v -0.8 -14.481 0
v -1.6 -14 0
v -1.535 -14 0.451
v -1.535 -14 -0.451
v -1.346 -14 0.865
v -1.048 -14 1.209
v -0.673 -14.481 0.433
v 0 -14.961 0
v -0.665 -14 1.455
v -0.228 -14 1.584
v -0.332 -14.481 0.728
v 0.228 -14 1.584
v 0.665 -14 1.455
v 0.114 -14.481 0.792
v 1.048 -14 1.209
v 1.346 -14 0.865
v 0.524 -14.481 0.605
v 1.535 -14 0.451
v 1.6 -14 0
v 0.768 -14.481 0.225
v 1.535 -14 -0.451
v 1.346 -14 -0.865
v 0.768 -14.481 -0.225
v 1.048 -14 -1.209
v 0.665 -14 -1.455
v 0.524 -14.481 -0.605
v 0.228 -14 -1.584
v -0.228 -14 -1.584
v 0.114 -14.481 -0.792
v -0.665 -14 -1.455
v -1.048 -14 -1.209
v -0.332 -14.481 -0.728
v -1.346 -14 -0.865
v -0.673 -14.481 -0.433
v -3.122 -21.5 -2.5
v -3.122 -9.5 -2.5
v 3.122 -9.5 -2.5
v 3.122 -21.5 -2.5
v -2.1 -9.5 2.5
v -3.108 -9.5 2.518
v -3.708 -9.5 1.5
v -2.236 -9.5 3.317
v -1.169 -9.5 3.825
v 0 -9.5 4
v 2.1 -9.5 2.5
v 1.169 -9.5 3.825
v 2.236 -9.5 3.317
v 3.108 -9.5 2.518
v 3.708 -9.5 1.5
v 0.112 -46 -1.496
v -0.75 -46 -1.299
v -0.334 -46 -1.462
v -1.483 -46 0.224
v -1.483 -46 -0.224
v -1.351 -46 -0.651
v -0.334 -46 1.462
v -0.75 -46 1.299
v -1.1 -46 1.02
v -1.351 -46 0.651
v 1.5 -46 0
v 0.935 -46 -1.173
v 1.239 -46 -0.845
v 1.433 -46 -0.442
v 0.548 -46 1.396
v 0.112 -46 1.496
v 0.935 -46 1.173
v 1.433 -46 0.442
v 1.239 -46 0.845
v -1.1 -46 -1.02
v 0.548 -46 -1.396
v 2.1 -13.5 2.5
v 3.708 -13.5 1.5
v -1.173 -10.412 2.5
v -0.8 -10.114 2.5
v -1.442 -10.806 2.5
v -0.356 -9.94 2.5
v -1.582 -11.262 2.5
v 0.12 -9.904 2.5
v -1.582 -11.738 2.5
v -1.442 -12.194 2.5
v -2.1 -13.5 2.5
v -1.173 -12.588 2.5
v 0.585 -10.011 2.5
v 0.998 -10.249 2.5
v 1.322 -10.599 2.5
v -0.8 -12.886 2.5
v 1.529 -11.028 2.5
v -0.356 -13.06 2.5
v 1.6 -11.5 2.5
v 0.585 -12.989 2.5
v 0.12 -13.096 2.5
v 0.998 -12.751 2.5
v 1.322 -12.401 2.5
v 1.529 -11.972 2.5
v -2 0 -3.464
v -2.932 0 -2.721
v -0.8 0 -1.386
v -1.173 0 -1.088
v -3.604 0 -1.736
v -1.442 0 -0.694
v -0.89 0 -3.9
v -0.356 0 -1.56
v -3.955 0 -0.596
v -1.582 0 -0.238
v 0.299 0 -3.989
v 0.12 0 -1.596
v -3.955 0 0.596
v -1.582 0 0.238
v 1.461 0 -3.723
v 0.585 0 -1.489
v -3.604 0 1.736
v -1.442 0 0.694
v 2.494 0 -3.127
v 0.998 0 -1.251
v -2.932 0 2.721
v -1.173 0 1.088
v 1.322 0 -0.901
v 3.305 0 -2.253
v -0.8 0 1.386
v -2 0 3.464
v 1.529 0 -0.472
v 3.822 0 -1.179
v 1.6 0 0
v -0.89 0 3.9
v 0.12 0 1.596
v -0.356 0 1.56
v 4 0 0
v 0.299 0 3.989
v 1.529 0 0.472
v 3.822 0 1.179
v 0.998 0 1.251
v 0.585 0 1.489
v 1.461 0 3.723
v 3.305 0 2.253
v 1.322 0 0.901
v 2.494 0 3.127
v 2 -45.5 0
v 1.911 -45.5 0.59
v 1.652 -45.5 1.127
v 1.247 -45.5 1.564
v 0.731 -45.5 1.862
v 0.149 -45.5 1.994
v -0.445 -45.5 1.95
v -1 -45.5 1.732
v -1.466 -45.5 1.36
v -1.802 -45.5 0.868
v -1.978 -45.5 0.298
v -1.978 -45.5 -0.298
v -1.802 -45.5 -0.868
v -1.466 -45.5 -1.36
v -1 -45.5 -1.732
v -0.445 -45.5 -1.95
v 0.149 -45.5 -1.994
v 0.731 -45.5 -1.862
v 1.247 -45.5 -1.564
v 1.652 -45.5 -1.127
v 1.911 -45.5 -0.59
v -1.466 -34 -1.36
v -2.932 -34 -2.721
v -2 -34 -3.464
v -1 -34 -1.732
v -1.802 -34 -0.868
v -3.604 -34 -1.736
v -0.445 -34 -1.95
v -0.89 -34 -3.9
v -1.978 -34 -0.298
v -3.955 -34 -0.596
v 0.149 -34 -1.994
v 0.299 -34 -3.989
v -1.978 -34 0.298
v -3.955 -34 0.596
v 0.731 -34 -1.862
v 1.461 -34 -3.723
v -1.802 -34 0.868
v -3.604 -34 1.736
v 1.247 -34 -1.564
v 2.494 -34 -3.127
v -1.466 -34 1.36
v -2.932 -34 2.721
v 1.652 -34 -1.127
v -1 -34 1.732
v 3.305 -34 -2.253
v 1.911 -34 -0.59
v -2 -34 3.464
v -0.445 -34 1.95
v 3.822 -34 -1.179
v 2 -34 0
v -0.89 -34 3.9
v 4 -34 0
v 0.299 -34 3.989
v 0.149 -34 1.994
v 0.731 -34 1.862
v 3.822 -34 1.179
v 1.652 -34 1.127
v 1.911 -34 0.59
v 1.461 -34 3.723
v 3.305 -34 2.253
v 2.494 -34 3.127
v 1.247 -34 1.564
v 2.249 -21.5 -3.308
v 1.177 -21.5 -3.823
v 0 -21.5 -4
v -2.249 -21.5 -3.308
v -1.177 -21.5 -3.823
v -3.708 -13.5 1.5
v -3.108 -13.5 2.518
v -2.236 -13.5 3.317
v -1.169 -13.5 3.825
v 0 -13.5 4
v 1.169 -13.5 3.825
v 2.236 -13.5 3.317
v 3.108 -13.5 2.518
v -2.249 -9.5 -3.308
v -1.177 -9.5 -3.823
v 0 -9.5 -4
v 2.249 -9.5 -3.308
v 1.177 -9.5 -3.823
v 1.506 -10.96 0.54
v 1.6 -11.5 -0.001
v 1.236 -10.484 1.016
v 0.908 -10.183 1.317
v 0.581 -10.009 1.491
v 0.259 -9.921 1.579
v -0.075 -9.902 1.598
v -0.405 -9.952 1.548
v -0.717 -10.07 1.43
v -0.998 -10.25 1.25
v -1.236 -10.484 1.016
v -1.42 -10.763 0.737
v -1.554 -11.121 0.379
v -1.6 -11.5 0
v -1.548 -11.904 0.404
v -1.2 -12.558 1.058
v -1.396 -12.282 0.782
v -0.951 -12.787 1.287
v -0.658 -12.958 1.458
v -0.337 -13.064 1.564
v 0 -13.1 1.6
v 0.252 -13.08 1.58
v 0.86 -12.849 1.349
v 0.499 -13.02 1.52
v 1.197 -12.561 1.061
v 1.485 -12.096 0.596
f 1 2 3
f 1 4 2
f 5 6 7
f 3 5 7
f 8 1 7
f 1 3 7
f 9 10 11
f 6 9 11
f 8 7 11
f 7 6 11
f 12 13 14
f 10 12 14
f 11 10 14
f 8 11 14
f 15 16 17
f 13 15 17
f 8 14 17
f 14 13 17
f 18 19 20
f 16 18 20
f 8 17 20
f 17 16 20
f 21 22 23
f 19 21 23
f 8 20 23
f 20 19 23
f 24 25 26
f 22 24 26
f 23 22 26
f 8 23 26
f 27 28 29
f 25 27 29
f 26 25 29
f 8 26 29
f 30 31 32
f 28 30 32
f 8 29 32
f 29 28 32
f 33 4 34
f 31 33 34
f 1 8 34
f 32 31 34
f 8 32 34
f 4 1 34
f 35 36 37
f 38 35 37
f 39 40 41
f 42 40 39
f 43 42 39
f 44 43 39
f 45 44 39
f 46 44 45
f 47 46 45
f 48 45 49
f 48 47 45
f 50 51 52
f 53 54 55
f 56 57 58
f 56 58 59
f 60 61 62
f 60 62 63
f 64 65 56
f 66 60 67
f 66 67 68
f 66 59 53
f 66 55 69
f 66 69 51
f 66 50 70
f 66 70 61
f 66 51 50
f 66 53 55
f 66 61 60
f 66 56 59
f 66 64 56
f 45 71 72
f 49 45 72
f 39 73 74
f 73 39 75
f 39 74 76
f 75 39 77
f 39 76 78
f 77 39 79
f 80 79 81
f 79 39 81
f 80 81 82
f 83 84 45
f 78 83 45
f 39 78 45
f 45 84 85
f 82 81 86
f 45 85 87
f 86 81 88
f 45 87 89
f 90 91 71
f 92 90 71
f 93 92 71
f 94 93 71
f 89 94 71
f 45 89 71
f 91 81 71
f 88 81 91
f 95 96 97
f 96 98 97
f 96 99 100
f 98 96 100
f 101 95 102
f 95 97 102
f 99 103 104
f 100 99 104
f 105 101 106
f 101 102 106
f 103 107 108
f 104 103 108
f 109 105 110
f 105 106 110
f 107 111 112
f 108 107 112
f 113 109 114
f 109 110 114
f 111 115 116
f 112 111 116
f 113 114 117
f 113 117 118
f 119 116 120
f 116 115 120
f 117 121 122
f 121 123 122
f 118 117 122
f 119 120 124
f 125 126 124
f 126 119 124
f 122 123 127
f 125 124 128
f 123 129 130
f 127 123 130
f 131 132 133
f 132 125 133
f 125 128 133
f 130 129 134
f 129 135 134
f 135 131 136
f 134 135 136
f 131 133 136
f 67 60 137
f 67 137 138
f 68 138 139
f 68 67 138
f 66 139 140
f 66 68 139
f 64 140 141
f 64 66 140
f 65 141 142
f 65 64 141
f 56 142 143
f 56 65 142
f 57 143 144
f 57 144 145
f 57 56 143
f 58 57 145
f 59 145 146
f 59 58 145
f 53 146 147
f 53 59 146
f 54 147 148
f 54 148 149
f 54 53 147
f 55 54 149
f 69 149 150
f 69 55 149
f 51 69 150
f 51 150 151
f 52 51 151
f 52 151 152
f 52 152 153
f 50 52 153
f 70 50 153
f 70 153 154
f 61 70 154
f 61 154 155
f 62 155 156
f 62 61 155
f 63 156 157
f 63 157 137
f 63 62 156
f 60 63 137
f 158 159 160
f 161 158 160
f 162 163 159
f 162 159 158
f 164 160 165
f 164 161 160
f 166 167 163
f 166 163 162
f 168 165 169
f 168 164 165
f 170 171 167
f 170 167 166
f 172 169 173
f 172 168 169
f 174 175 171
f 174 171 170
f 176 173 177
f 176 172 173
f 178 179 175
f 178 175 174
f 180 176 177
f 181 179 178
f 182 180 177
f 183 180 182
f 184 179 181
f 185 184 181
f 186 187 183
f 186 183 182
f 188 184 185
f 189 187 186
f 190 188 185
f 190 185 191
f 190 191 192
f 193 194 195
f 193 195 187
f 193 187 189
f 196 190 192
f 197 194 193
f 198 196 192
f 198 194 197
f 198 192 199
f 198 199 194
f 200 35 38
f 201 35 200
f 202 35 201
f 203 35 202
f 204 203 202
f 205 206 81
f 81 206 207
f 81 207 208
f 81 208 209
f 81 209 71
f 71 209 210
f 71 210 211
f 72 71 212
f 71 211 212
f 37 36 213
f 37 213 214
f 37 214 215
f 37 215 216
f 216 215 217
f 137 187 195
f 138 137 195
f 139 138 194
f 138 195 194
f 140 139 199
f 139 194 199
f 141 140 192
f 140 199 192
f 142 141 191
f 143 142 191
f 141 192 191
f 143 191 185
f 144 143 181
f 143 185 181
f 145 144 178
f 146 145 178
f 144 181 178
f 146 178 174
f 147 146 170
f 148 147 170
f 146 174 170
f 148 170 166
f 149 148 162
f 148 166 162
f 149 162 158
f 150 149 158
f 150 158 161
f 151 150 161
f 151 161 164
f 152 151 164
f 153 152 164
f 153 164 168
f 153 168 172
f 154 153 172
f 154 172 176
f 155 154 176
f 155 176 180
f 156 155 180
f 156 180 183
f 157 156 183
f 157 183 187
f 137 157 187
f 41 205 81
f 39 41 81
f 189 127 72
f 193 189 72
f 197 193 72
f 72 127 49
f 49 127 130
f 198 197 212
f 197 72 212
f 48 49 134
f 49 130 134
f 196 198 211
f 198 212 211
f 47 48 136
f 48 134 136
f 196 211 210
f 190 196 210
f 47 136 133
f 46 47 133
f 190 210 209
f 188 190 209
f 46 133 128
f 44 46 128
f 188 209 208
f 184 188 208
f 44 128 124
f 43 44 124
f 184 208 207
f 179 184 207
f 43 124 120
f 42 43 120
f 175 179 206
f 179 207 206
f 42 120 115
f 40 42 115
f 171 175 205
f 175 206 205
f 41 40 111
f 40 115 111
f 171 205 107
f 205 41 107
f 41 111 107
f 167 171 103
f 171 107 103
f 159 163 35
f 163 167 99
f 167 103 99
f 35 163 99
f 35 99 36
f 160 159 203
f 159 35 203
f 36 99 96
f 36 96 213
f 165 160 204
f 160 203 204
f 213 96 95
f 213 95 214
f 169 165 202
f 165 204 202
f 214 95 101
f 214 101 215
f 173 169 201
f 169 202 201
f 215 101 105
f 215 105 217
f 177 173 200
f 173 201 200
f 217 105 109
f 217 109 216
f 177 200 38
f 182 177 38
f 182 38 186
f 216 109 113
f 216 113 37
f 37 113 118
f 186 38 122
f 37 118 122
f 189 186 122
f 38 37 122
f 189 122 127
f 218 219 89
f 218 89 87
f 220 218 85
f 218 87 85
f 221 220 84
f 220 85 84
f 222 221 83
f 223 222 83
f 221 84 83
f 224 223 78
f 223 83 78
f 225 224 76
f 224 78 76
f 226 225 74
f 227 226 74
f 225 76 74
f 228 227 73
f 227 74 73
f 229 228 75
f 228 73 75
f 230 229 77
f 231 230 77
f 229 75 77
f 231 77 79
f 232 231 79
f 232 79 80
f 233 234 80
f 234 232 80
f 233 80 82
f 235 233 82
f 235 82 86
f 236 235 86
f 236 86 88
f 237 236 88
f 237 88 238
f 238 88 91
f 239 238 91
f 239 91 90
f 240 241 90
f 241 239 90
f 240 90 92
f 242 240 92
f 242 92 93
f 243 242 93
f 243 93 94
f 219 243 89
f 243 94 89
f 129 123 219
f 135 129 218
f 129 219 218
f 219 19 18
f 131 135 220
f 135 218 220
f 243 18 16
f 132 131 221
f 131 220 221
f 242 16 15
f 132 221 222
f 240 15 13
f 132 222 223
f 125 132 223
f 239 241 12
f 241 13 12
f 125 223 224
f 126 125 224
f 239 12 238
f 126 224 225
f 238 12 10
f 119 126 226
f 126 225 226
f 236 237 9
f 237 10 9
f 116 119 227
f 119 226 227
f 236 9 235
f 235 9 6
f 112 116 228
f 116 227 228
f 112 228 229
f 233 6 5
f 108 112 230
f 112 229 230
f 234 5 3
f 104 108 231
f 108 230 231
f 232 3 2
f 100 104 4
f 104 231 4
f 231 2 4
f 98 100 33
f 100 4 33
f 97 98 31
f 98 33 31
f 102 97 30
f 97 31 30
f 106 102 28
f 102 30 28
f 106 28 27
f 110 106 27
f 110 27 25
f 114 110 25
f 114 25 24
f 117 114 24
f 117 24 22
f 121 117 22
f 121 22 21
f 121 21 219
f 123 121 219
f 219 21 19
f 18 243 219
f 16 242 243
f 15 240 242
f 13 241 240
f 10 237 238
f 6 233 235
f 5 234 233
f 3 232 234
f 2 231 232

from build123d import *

# Parameters (mm, degrees)
F0_R          = 4
F0_R_2        = 2
F1_DEPTH      = 34
F2_DEPTH      = 46
F4_SIZE       = 0.5
F6_D          = 3.2
F6_DEPTH      = 14
F6_TIP        = 0.9613769904
F8_DEPTH      = 2
F7_W          = 8
F7_H          = 1.5
F9_DEPTH      = 10
F9_DEPTH_BACK = 2
F10_R         = 1.6
F11_DEPTH     = 2.501


with BuildPart() as f1:
    # F0 (on Front) → F1 (new body)
    with BuildSketch(Plane.XZ):
        Circle(F0_R)
        Circle(F0_R_2, mode=Mode.SUBTRACT)
        Circle(F0_R_2)
    extrude(amount=F1_DEPTH)

    # F0 (on Front) → F2 (join)
    with BuildSketch(Plane.XZ):
        Circle(F0_R_2)
    extrude(amount=F2_DEPTH)

    # F4
    f4_edges = [f1.edges().sort_by_distance(p)[0] for p in [
        (-2, -46, 0),
    ]]
    chamfer(f4_edges, length=F4_SIZE)

    # F6
    with Locations(Plane(origin=(0, 0, 0), x_dir=(-1, 0, 0), z_dir=(0, 1, 0))):
        with Locations((0, 0)):
            Hole(F6_D / 2, depth=F6_DEPTH)
            with Locations((0, 0, -(F6_DEPTH + F6_TIP / 2))):  # 118° drill point
                Cone(0, F6_D / 2, F6_TIP, mode=Mode.SUBTRACT)

    # F7 (on offset) → F8 (cut, symmetric)
    with BuildSketch(Plane.XZ.offset(11.5)):
        Polygon((-3.7080992435, 4), (-3.7080992435, 1.5), (-2.1, 2.5), (2.1, 2.5), (3.7080992435, 1.5), (3.7080992435, 4), align=None)
    extrude(amount=F8_DEPTH, both=True, mode=Mode.SUBTRACT)

    # F7 (on offset) → F9 (cut, two sides)
    with BuildSketch(Plane.XZ.offset(11.5)) as f9_sk:
        with Locations((0, -3.25)):
            Rectangle(F7_W, F7_H)
    extrude(amount=F9_DEPTH, mode=Mode.SUBTRACT)
    extrude(f9_sk.sketch, amount=-F9_DEPTH_BACK, mode=Mode.SUBTRACT)

    # F10 (on face) → F11 (cut, through all)
    with BuildSketch(Plane.XY.offset(2.5)):
        with Locations((0, -11.5)):
            Circle(F10_R)
    extrude(amount=-F11_DEPTH, mode=Mode.SUBTRACT)


solid = f1.part
